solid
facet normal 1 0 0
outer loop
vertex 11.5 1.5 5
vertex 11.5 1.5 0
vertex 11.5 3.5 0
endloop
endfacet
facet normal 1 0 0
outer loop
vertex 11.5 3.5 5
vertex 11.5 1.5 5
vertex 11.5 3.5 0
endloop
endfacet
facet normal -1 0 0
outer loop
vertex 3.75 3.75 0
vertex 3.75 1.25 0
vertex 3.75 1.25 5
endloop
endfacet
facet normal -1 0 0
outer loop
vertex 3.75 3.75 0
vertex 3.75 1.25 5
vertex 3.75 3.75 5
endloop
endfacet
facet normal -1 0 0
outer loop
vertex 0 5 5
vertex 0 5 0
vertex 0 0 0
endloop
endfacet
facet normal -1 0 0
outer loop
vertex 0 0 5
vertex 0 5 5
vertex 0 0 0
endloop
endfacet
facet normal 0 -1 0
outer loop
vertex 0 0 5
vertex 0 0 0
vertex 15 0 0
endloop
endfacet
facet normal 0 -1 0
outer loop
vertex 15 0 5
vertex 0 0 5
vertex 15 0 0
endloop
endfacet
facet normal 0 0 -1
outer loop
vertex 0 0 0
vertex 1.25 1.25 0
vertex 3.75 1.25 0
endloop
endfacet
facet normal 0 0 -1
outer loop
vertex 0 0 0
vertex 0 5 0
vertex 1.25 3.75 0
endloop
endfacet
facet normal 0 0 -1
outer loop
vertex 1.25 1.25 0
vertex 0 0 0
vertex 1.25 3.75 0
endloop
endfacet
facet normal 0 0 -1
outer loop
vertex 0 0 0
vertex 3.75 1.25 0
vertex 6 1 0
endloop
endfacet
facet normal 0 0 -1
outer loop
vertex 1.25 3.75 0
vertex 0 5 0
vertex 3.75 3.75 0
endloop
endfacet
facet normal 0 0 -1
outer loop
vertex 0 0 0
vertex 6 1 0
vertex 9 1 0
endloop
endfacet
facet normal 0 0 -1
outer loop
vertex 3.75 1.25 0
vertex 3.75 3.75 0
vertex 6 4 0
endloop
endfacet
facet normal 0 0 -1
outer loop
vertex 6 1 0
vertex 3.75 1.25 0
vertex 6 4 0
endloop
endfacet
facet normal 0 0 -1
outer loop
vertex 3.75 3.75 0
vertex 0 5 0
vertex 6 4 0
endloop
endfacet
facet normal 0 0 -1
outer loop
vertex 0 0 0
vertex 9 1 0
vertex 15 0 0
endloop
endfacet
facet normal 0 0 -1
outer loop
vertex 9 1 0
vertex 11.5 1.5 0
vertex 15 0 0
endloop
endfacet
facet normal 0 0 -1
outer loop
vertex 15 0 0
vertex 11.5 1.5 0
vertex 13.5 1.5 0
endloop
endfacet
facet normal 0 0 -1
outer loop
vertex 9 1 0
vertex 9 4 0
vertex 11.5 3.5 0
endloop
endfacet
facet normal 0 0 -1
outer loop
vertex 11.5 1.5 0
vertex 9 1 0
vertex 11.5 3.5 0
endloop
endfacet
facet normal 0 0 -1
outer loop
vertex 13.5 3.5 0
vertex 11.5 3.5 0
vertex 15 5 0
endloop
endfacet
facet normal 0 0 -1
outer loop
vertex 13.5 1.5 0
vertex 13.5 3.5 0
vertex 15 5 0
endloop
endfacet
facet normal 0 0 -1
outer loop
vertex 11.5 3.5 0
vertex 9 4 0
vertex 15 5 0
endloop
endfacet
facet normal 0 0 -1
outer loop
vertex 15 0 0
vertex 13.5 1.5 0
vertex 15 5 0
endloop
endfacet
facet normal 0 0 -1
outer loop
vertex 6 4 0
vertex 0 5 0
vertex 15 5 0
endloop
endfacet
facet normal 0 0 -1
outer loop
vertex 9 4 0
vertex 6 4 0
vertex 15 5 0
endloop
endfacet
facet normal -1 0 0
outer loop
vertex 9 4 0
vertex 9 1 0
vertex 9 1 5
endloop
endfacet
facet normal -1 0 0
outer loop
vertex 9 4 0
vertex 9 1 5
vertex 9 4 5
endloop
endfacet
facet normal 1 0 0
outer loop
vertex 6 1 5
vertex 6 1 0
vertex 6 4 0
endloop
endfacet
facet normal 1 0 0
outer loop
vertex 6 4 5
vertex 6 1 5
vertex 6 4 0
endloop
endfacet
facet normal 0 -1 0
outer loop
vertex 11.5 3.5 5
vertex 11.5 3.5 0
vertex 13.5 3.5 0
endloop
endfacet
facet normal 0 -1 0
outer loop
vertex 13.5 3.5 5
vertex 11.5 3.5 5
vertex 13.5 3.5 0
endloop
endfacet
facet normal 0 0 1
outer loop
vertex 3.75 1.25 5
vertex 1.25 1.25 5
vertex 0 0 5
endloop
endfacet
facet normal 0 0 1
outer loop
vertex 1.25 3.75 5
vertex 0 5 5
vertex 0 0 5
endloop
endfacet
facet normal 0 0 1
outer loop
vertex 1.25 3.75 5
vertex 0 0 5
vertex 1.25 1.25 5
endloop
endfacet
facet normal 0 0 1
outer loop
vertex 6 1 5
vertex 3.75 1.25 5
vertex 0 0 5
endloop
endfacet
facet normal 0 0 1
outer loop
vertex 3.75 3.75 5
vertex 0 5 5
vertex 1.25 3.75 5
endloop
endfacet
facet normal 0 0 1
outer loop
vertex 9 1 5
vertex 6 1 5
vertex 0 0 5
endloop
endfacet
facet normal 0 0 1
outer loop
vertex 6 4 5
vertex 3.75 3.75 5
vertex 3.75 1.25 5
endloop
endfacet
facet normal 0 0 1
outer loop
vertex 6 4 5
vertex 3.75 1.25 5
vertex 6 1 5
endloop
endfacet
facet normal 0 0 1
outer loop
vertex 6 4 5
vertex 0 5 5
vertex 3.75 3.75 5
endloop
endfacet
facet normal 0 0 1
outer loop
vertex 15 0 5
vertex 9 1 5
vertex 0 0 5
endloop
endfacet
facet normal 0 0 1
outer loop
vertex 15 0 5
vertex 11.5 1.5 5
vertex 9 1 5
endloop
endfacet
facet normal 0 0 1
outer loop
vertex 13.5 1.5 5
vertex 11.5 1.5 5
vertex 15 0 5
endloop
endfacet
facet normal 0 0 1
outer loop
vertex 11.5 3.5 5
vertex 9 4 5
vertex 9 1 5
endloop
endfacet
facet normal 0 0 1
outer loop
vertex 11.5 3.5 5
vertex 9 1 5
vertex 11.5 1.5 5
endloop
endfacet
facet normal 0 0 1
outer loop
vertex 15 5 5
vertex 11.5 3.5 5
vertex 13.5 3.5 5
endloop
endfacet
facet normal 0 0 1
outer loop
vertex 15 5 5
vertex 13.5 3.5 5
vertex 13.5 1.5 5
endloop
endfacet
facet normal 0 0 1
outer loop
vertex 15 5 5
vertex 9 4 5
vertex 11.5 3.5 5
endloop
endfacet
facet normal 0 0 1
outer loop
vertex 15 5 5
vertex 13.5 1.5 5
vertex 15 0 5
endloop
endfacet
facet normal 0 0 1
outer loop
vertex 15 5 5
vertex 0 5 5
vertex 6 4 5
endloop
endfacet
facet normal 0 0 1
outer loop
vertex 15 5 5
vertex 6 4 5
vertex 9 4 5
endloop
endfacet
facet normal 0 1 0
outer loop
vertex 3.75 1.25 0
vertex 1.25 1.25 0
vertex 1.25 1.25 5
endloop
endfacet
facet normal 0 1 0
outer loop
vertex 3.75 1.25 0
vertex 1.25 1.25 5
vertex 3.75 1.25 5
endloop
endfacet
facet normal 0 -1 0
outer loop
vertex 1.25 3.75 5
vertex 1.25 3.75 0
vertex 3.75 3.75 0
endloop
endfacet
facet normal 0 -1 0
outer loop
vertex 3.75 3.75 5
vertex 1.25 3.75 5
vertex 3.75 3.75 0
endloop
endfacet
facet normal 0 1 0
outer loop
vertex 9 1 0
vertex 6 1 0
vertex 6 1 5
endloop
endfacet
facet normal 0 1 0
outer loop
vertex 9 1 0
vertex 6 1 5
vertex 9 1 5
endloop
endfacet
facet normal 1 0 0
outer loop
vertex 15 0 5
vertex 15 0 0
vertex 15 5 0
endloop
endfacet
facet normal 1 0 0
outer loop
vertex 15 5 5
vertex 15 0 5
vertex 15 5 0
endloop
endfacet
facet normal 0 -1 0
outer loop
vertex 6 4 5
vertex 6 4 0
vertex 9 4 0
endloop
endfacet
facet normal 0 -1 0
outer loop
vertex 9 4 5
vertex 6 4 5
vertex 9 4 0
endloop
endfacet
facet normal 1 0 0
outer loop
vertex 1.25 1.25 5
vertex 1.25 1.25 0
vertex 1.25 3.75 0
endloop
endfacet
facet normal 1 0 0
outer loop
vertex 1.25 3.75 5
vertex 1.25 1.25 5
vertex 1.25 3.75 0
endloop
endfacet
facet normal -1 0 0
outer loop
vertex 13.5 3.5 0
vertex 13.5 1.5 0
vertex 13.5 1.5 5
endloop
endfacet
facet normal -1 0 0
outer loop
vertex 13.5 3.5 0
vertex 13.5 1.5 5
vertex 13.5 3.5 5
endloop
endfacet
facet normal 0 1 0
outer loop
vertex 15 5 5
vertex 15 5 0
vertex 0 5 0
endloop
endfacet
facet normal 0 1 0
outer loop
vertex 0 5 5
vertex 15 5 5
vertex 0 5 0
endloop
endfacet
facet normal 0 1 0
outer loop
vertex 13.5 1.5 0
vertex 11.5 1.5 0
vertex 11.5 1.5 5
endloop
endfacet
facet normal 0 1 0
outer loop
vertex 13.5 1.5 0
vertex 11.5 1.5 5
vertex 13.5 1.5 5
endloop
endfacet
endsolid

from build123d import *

# Parameters (mm, degrees)
SKETCH1_W           = 2.5
SKETCH1_H           = 2.5
SKETCH1_W_2         = 2
SKETCH1_H_2         = 2
SKETCH1_W_3         = 3
SKETCH1_H_3         = 3
BOSS_EXTRUDE1_DEPTH = 5


with BuildPart() as part:
    # Sketch1 → Boss-Extrude1 (new body)
    with BuildSketch(Plane.XY):
        Polygon((0, 0), (5, 0), (15, 0), (15, 5), (5, 5), (0, 5), align=None)
        with Locations((2.5, 2.5)):
            Rectangle(SKETCH1_W, SKETCH1_H, mode=Mode.SUBTRACT)
        with Locations((12.5, 2.5)):
            Rectangle(SKETCH1_W_2, SKETCH1_H_2, mode=Mode.SUBTRACT)
        with Locations((7.5, 2.5)):
            Rectangle(SKETCH1_W_3, SKETCH1_H_3, mode=Mode.SUBTRACT)
    extrude(amount=BOSS_EXTRUDE1_DEPTH)


solid = part.part
